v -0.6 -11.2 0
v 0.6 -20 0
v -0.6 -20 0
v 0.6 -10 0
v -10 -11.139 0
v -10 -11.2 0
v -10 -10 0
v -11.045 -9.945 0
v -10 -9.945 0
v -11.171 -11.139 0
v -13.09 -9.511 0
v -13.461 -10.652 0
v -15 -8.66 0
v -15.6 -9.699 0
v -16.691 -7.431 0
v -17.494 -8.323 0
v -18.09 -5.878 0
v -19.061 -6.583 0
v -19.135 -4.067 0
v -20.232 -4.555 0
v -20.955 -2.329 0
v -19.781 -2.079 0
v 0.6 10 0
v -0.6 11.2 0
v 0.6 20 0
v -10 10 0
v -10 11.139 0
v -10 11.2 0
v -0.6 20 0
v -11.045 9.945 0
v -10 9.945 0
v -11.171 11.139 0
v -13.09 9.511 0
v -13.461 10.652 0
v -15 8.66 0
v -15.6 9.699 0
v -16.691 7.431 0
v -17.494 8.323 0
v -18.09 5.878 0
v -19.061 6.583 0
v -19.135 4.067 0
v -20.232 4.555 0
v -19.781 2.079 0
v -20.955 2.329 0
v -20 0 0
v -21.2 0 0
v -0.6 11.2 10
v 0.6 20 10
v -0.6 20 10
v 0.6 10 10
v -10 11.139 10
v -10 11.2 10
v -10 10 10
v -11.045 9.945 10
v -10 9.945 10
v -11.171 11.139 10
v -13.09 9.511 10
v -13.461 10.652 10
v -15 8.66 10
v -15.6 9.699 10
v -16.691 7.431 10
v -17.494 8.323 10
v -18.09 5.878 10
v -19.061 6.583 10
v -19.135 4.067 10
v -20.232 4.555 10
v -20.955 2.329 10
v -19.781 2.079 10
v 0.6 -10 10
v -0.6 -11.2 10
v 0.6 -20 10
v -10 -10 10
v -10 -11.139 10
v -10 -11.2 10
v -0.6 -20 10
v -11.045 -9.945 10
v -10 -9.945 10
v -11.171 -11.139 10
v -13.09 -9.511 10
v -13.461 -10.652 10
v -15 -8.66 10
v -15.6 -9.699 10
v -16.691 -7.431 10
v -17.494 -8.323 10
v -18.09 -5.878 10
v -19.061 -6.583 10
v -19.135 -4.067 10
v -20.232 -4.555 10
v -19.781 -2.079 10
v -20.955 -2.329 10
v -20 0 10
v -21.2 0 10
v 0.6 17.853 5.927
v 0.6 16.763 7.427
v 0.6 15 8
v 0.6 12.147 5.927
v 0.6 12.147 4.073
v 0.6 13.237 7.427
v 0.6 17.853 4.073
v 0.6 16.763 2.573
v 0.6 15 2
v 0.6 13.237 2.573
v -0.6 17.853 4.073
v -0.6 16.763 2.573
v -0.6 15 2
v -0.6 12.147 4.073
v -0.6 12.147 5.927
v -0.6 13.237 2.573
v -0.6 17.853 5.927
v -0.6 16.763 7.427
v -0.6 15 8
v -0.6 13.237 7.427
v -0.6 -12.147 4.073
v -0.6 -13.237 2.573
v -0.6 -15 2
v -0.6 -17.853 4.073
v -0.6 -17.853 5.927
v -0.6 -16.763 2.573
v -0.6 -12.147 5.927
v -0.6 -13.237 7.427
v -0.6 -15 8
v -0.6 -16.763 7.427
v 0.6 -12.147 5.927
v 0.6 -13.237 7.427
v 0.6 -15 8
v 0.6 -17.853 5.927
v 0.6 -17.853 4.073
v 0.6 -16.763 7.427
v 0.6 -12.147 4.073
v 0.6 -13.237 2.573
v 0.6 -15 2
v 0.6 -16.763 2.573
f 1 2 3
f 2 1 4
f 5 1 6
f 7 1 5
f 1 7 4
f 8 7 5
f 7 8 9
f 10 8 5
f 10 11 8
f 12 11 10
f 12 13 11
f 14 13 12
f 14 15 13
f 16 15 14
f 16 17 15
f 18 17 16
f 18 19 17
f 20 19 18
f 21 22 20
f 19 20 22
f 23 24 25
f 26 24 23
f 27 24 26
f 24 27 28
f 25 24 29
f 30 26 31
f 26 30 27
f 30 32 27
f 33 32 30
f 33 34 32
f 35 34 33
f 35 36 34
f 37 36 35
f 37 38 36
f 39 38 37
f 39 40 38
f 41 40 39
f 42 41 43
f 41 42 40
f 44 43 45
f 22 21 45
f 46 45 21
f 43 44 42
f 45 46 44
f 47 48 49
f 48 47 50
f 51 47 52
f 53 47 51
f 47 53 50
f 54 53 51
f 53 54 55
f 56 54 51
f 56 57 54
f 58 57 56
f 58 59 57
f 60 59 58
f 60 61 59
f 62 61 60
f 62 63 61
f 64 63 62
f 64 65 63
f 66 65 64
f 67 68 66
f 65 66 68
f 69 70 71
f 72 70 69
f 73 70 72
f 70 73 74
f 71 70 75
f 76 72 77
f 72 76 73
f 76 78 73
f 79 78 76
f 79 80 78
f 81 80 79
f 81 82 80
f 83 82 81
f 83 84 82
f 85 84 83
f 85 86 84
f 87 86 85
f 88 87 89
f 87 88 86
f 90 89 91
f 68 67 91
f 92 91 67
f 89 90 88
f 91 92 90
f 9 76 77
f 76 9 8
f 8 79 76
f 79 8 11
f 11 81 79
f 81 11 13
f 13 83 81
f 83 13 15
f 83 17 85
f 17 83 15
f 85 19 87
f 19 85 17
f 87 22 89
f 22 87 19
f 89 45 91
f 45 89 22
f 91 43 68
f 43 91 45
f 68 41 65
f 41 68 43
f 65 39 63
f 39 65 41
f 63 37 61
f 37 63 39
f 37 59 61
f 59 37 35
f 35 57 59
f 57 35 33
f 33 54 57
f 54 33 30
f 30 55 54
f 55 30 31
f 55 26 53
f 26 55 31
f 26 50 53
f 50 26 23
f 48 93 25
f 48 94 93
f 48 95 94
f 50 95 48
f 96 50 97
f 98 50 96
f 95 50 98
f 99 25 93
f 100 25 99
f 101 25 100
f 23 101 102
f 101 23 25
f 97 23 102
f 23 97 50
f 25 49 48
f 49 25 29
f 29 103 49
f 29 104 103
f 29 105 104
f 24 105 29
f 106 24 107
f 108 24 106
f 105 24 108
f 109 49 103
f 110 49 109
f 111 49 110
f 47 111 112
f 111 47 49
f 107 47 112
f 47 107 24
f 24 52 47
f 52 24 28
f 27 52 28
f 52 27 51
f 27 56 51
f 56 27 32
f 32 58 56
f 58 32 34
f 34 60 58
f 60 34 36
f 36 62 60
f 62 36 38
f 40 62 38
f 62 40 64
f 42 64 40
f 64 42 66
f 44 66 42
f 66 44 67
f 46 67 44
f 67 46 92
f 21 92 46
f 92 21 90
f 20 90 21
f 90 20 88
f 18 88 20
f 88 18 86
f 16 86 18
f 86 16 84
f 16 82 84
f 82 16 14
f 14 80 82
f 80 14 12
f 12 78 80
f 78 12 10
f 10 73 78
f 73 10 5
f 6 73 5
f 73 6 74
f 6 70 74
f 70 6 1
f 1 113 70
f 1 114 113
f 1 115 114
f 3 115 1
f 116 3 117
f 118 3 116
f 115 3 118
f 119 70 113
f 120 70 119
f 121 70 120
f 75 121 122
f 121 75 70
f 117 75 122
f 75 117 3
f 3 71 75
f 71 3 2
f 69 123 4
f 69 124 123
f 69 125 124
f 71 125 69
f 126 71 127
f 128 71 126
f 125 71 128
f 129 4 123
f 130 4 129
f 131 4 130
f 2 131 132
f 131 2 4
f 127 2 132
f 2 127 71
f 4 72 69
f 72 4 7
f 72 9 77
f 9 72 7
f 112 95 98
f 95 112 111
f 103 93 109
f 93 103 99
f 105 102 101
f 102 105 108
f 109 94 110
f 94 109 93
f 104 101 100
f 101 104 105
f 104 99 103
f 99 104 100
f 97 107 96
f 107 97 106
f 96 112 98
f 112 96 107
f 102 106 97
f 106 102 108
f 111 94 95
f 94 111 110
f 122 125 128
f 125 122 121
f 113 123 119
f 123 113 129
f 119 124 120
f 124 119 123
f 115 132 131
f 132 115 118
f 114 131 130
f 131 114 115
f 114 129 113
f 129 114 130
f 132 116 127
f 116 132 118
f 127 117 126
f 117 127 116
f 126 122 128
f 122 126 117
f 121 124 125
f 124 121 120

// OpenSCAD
// Diameter of drilling hols in mm
Hole_Diameter = 3;//[0:8.5]
// diameter of the pipe/cable in mm
pipe_diameter = 20;
//thickness of the clamb in mm
thickness = 1.2;
difference() {
  linear_extrude( height=10, twist=0, scale=[1, 1], center=false){
    union(){
      union(){
        translate([(pipe_diameter / -2), 0, 0]){
          difference() {
            circle(r=(pipe_diameter / 2 + thickness));

            circle(r=(pipe_diameter / 2));
            translate([500, 0, 0]){
              square([1000, 1000], center=true);
            }
          }
        }
        translate([(pipe_diameter / -2), (pipe_diameter / 2), 0]){
          square([(pipe_diameter / 2), thickness], center=false);
        }
        translate([(pipe_diameter / -2), (pipe_diameter / -2 - thickness), 0]){
          square([(pipe_diameter / 2), thickness], center=false);
        }
      }
      translate([0, (pipe_diameter / 2 + 5), 0]){
        square([thickness, 10], center=true);
      }
      translate([0, (pipe_diameter / -2 + -5), 0]){
        square([thickness, 10], center=true);
      }
    }
  }

  translate([0, (pipe_diameter / 2 + 5), 5]){
    rotate([0, 90, 0]){
      cylinder(r1=Hole_Diameter, r2=3, h=10, center=true);
    }
  }
  translate([0, (pipe_diameter / -2 + -5), 5]){
    rotate([0, 90, 0]){
      cylinder(r1=Hole_Diameter, r2=3, h=10, center=true);
    }
  }
}
//0;

//2;
